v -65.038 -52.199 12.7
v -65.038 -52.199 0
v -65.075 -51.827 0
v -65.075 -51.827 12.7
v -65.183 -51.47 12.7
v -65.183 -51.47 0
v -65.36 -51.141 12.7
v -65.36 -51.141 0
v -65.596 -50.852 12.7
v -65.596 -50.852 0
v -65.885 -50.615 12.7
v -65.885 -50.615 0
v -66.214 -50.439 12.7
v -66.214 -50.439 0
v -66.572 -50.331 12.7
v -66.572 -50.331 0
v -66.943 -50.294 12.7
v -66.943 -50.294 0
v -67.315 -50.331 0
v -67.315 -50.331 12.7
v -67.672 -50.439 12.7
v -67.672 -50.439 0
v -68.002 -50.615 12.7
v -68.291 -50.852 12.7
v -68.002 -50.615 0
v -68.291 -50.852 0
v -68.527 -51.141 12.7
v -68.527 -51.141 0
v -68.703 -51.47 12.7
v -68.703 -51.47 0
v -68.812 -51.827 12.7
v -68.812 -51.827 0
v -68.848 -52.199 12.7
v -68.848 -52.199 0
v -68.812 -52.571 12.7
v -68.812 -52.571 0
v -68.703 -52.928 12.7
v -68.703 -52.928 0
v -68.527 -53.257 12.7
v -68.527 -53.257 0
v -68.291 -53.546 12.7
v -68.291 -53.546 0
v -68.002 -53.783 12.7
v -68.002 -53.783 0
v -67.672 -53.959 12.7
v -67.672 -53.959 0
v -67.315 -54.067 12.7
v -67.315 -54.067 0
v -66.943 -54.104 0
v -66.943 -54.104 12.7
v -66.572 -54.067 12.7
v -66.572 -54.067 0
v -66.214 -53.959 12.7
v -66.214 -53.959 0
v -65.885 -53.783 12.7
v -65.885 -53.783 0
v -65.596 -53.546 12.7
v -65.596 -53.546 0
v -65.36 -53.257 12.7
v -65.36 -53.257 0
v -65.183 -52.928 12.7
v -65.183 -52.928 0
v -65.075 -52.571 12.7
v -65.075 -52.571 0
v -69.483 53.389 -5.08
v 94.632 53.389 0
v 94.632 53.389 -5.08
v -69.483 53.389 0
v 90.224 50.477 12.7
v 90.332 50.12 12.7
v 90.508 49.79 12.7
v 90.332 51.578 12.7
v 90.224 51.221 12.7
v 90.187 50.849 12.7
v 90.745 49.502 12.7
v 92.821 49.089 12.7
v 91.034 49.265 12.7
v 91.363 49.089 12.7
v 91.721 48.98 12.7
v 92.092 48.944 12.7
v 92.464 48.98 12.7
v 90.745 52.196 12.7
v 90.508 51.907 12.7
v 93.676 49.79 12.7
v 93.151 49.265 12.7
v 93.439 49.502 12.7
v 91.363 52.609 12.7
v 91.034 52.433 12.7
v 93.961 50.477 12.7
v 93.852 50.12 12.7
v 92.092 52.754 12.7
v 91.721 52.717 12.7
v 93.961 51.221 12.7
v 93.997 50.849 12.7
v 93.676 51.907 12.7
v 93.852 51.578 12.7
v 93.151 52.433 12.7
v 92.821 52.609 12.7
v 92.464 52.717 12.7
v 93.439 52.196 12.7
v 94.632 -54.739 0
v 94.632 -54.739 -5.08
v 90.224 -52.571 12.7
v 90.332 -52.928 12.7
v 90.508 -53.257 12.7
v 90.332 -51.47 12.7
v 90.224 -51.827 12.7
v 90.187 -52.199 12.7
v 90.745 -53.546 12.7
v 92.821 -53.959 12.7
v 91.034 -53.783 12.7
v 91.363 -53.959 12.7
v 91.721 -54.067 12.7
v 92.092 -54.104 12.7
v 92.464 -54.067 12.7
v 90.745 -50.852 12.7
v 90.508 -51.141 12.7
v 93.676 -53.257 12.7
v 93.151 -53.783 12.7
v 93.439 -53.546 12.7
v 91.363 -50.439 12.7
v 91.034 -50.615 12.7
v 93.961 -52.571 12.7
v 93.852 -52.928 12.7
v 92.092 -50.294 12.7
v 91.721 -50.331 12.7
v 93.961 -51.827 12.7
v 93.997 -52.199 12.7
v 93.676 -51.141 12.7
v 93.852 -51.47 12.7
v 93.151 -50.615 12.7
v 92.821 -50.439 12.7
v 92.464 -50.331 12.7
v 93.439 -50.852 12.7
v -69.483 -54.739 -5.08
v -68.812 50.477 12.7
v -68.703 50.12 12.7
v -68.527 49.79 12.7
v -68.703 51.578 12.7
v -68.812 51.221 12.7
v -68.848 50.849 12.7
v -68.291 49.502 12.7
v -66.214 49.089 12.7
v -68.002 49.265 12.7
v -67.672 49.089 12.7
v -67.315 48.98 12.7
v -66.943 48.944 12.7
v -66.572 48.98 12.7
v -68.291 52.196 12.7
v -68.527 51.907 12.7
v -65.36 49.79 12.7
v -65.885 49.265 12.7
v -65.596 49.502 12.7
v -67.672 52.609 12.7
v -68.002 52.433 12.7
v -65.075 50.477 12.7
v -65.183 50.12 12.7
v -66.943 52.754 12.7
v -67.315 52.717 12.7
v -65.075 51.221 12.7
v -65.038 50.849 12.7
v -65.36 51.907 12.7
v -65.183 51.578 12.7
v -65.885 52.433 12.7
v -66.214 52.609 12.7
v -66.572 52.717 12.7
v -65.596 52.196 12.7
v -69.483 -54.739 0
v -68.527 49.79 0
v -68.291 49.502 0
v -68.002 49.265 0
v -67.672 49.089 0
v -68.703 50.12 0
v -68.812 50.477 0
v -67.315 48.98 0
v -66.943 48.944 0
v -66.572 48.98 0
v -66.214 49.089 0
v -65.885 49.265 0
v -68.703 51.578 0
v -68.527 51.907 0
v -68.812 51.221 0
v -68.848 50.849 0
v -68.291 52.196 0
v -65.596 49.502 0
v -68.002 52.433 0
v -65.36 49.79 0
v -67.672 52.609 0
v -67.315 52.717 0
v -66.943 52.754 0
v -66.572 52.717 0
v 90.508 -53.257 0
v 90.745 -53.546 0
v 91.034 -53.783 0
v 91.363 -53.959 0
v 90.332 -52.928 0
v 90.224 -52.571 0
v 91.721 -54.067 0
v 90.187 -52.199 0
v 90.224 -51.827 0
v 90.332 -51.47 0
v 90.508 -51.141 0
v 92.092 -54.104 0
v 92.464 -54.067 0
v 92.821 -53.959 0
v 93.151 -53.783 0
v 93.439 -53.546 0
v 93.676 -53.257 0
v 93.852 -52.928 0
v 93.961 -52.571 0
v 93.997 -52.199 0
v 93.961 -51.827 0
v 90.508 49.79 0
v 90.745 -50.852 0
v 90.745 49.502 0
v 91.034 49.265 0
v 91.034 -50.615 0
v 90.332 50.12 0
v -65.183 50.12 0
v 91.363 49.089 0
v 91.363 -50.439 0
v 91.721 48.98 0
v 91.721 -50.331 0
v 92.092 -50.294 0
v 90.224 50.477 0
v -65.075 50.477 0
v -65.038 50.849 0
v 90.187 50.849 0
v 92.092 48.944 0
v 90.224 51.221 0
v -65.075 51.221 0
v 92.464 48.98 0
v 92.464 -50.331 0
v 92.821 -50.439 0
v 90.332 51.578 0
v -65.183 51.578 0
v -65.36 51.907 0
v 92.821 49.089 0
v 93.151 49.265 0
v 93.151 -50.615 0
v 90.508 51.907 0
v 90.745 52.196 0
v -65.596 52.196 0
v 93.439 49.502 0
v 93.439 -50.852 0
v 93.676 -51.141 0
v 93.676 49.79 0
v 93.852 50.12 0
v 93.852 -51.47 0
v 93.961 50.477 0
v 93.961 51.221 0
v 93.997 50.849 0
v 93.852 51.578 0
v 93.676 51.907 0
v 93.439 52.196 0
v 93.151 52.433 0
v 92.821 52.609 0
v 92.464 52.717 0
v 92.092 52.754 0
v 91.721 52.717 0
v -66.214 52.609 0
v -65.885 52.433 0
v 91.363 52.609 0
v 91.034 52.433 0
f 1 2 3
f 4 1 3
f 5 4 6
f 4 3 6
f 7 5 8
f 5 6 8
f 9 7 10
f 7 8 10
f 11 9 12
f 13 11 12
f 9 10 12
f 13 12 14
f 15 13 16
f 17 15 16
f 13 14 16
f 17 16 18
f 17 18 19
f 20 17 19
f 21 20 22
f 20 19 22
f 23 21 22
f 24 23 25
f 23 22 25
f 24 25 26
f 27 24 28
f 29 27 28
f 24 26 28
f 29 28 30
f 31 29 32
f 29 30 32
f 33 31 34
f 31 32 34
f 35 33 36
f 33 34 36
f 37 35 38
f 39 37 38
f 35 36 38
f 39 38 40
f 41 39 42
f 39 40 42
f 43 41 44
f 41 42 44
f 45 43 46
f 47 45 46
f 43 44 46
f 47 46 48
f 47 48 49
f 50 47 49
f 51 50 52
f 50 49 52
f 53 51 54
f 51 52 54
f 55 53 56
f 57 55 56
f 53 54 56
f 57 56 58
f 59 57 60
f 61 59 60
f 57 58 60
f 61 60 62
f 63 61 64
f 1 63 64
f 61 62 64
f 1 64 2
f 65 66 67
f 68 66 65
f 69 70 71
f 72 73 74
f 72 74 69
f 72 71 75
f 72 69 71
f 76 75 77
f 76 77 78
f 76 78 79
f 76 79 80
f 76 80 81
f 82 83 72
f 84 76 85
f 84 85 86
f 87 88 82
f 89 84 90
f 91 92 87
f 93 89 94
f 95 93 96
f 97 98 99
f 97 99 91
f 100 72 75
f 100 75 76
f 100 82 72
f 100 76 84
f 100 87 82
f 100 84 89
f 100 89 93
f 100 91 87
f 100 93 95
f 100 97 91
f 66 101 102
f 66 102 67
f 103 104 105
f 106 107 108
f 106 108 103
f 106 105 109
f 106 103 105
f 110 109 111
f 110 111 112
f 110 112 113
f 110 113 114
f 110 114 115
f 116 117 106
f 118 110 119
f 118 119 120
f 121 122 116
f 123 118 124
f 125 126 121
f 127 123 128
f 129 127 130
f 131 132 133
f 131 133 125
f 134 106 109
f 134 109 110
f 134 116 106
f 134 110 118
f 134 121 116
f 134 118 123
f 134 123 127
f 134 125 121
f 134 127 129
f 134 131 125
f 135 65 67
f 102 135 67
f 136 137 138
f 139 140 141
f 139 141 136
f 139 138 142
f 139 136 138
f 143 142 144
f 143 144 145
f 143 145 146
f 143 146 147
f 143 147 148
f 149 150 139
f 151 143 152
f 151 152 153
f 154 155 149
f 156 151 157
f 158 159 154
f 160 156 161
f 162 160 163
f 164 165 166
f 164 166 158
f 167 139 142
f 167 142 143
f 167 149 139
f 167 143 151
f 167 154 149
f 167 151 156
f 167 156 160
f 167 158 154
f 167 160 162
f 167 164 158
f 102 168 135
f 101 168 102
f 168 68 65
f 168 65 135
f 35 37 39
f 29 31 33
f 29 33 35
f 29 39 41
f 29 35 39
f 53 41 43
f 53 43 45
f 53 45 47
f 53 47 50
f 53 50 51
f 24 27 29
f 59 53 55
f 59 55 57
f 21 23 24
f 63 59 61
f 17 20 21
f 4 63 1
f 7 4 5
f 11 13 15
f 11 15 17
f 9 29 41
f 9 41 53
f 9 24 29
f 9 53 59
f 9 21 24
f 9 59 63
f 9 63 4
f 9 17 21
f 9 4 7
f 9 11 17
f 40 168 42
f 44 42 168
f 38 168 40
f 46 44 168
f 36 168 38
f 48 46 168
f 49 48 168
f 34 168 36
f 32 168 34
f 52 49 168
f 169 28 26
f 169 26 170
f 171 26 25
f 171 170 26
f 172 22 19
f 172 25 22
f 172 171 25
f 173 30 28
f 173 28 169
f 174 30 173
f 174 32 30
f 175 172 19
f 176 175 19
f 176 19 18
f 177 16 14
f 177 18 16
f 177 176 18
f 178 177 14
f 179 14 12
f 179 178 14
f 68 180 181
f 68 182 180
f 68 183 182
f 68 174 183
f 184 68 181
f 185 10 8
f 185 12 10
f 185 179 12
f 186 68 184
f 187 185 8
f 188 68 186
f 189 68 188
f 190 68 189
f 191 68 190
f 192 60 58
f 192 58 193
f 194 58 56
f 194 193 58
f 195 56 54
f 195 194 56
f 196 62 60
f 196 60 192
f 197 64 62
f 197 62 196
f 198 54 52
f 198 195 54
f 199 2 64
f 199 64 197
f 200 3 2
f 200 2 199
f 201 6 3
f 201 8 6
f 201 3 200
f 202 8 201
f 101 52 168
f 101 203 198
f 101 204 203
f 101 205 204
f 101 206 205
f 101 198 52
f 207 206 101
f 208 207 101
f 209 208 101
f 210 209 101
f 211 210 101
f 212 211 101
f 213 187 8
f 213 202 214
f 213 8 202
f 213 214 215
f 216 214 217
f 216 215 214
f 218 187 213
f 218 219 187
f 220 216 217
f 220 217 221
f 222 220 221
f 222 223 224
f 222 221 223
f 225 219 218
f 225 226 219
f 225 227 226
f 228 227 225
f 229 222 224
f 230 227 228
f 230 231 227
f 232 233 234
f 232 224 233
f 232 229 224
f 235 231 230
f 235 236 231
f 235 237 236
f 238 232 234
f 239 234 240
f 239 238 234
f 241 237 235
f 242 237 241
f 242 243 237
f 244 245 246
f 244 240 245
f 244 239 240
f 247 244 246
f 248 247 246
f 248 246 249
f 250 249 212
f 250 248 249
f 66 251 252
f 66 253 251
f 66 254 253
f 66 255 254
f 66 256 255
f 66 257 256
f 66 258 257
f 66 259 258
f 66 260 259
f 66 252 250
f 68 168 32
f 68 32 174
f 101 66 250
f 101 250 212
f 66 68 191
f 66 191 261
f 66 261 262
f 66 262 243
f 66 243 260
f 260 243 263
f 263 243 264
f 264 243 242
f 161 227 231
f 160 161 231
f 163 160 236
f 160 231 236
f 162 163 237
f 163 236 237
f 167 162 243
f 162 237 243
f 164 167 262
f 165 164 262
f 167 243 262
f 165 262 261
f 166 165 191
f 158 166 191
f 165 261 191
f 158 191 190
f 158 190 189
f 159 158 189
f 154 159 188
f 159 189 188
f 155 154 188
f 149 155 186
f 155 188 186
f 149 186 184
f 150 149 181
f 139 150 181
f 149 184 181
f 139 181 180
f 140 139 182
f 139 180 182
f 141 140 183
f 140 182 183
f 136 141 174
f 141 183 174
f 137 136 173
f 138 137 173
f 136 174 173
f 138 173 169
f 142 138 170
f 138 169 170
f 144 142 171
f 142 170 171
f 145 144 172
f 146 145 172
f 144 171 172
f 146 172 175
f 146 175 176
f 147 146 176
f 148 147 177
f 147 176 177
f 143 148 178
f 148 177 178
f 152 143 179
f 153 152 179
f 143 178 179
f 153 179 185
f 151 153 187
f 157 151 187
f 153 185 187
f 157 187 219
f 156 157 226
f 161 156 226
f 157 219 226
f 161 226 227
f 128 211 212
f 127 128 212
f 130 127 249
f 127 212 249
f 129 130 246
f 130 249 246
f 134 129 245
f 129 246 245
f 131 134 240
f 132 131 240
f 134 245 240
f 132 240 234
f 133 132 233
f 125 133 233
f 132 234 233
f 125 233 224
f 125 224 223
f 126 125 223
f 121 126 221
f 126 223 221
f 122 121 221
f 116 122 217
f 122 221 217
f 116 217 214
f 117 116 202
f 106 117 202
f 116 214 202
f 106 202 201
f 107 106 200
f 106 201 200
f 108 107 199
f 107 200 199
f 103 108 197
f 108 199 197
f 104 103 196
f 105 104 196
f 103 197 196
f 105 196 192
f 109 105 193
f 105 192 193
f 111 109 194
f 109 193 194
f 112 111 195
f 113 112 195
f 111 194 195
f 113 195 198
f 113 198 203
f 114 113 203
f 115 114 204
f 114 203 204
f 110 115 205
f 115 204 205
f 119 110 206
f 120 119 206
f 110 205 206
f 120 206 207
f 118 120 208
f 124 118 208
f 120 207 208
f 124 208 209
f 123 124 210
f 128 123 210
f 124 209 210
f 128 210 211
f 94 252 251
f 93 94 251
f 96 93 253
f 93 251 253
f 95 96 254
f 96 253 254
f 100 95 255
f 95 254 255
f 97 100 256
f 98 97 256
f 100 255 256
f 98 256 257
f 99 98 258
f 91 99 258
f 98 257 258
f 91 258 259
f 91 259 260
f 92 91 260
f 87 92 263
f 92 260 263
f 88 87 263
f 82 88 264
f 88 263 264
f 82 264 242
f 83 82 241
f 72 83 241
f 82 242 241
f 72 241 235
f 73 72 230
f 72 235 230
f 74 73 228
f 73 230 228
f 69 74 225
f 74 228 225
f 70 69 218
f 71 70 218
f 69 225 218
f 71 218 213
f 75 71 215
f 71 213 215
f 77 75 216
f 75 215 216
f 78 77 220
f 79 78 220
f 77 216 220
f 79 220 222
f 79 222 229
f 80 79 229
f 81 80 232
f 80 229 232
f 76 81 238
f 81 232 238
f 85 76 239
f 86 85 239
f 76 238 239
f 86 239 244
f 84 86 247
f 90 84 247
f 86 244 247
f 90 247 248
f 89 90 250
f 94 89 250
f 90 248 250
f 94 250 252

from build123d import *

# Parameters (mm, degrees)
F2_DEPTH = 5.08
F1_R     = 1.905
F3_DEPTH = 12.7


with BuildPart() as f2:
    # F0 (on Top) → F2 (new body)
    with BuildSketch(Plane.XY):
        Polygon((89.55228, 53.388856), (-26.639517, 53.388856), (-64.403486, 53.388856), (-69.483486, 53.388856), (-69.483486, 48.308856), (-69.483486, -49.658944), (-69.483486, -54.738944), (-64.403486, -54.738944), (-26.639517, -54.738944), (89.55228, -54.738944), (94.63228, -54.738944), (94.63228, 12.150785), (94.63228, 53.388856), align=None)
    extrude(amount=-F2_DEPTH)

    # F1 (on Top) → F3 (join)
    with BuildSketch(Plane.XY):
        with Locations((-66.943486, -52.198944)):
            Circle(F1_R)
        with Locations((-66.943486, 50.848856)):
            Circle(F1_R)
        with Locations((92.09228, 50.848856)):
            Circle(F1_R)
        with Locations((92.09228, -52.198944)):
            Circle(F1_R)
    extrude(amount=F3_DEPTH)


solid = f2.part
